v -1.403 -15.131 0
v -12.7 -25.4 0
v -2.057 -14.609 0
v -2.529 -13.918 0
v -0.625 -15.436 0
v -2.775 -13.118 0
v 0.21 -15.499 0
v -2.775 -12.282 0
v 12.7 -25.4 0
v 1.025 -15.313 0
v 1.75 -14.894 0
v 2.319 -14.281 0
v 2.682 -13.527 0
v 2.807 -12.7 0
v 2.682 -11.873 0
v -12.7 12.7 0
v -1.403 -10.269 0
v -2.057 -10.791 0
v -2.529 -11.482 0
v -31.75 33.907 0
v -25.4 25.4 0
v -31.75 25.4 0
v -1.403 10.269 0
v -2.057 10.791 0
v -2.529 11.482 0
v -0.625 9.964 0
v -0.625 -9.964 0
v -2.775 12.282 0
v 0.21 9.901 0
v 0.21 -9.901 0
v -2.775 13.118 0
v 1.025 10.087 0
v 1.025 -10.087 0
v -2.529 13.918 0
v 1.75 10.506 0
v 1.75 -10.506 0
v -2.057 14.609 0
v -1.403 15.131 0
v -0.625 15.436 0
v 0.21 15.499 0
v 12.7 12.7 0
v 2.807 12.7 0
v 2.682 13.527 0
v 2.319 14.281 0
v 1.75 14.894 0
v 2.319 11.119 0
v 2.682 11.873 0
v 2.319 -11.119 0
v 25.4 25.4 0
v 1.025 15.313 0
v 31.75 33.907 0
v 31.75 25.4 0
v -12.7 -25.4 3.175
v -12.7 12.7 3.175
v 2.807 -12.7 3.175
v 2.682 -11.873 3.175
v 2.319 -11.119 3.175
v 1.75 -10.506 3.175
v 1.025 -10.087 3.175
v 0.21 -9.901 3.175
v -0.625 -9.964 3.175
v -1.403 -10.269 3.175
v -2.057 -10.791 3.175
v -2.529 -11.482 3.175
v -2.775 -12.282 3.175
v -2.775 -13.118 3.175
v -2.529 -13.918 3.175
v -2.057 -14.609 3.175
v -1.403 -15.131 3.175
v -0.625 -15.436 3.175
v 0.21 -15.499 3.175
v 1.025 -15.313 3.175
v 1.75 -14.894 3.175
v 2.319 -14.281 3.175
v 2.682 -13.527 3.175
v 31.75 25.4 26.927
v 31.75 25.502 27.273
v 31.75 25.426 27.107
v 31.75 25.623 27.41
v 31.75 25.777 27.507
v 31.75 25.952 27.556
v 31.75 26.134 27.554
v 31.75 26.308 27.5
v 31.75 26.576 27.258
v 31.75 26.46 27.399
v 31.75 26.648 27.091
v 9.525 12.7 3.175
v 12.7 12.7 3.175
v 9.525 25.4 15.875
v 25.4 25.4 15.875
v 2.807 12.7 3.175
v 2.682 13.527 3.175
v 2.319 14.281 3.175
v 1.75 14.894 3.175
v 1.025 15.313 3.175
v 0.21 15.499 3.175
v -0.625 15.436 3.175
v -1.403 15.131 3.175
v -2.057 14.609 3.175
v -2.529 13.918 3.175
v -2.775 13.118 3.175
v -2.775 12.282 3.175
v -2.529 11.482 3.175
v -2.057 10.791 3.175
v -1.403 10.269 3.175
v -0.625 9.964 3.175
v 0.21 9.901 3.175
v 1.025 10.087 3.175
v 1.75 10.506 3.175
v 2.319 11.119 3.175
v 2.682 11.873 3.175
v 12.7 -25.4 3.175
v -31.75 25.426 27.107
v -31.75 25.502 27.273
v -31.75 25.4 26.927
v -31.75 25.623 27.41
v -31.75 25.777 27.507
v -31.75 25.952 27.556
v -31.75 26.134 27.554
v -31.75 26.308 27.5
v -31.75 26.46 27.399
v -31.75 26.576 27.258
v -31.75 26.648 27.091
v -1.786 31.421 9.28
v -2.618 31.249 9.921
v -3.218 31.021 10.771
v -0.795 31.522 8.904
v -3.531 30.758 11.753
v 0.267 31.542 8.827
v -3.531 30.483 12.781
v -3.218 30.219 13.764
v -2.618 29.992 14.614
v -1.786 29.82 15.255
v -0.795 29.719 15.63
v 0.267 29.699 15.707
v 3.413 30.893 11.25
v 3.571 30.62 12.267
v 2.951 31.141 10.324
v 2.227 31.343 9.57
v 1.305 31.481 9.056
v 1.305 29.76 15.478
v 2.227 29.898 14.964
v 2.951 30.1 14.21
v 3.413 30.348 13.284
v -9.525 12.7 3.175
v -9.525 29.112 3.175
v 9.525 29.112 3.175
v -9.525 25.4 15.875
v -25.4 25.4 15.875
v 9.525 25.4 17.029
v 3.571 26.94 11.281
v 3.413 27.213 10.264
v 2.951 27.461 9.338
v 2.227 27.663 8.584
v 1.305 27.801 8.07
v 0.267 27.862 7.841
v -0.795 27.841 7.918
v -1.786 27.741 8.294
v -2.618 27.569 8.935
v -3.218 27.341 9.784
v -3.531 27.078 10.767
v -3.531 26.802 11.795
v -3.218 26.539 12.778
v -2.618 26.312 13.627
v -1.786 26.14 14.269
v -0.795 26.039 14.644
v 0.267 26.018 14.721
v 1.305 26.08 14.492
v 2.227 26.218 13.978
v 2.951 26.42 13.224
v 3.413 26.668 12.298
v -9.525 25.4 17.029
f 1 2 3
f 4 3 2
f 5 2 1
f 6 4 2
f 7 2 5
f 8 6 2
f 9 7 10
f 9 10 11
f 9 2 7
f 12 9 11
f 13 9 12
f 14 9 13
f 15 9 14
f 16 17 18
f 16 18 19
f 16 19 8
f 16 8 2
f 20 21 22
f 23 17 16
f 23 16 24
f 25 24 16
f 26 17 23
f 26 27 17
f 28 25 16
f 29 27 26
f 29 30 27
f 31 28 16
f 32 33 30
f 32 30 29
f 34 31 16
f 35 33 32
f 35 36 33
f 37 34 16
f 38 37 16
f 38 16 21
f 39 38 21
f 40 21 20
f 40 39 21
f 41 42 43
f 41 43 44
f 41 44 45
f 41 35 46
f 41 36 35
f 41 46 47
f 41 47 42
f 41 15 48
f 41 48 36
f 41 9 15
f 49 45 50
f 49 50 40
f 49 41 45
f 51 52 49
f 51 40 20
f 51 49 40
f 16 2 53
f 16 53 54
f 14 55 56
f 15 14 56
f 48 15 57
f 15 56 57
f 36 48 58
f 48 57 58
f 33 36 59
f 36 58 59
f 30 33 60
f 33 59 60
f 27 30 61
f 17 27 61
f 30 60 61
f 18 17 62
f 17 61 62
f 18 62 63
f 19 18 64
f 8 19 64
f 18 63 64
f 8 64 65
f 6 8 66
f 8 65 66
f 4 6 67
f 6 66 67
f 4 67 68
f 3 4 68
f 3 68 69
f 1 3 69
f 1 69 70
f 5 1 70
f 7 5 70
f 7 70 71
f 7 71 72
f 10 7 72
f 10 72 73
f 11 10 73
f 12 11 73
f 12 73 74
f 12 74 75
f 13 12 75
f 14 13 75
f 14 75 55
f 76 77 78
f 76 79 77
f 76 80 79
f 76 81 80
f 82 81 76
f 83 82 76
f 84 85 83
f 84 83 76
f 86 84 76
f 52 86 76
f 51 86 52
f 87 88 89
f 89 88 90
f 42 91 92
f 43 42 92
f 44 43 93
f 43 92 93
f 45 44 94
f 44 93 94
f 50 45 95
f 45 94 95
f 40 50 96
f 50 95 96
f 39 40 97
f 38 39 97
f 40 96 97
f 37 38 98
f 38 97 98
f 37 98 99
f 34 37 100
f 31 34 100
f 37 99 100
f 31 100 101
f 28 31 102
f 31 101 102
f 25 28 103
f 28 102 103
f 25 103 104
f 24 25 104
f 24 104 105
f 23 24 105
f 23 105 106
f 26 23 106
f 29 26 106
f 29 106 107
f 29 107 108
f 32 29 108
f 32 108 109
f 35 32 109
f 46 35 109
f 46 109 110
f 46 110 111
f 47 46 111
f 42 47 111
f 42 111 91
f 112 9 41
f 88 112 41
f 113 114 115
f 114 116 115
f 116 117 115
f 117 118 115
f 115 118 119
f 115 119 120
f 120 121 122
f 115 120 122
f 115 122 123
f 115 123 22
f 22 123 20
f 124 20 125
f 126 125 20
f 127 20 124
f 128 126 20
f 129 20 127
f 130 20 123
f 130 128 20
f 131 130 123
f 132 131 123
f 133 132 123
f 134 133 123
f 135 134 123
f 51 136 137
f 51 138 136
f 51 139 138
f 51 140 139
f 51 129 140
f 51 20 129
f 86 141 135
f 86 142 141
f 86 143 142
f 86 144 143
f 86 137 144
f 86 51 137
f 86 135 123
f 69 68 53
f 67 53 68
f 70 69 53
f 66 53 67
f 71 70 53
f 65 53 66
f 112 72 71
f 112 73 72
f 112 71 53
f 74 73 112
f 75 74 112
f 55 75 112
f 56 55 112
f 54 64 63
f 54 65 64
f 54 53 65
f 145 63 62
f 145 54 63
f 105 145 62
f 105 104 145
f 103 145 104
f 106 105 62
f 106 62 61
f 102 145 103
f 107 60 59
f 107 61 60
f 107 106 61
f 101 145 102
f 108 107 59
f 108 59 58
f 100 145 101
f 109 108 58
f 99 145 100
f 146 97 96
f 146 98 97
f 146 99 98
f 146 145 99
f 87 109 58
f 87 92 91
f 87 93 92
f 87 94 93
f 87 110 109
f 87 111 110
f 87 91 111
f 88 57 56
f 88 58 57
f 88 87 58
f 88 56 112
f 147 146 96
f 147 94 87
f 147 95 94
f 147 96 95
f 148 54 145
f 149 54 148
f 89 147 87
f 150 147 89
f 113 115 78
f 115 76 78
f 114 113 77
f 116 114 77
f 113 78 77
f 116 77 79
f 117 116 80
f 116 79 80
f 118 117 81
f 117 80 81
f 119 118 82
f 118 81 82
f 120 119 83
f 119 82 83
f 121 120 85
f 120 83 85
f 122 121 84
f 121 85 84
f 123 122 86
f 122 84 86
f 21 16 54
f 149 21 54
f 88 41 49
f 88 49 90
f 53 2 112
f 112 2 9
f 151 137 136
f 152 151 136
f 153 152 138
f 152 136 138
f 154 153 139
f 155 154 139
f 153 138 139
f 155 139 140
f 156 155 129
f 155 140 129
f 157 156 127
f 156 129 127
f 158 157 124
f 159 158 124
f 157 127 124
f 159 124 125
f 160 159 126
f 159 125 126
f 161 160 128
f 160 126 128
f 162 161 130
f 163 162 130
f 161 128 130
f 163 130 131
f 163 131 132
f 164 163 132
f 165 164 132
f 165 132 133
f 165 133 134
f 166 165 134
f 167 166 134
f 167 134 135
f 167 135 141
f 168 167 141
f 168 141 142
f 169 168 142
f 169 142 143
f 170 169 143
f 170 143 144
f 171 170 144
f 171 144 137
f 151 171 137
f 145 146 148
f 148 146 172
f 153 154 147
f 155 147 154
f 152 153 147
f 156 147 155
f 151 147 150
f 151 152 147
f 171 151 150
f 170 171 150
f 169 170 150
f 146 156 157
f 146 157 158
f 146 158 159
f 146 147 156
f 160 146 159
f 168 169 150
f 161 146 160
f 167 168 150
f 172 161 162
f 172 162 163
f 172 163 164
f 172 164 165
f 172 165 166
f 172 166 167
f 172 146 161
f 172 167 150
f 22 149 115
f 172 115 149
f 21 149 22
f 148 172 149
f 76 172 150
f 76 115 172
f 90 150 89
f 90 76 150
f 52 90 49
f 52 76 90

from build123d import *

# Parameters (mm, degrees)
SKETCH1_W                       = 25.4
SKETCH1_H                       = 50.8
BOSS_EXTRUDE1_DEPTH             = 3.175
F_10_CLEARANCE_HOLE1_D          = 5.6134
BOSS_EXTRUDE3_DEPTH             = 31.75
CHAMFER2_SIZE                   = 12.7
FILLET2_R                       = 0.635
BOSS_EXTRUDE4_REACH             = 64.331
BOSS_EXTRUDE4_DIRECTION_2_DEPTH = 3.175
BOSS_EXTRUDE5_REACH             = 64.331
BOSS_EXTRUDE5_DIRECTION_2_DEPTH = 3.175
F_1_4_CLEARANCE_HOLE2_REACH     = 70.01
F_1_4_CLEARANCE_HOLE2_BORE_R    = 3.57124
CUT_EXTRUDE1_START              = -9.525
CUT_EXTRUDE1_DEPTH              = 19.05


# Read off the part's stored shape, not the designer's step: Cut-Extrude1
with BuildPart() as part:
    # Sketch1 → Boss-Extrude1 (new body)
    with BuildSketch(Plane.XY):
        Rectangle(SKETCH1_W, SKETCH1_H)
    extrude(amount=BOSS_EXTRUDE1_DEPTH)

    # #10 Clearance Hole1 (through all)
    with Locations(Plane(origin=(0, 0, 0), x_dir=(-1, 0, 0), z_dir=(0, 0, -1))):
        with Locations((0, 12.7), (0, -12.7)):
            Hole(F_10_CLEARANCE_HOLE1_D / 2)

    # Sketch8 → Boss-Extrude3 (add, symmetric)
    with BuildSketch(Plane(origin=(0, 0, 0), x_dir=(0, 0, -1), z_dir=(1, 0, 0))):
        Polygon((0, 33.90738686), (-31.75, 25.4), (0, 25.4), align=None)
    extrude(amount=BOSS_EXTRUDE3_DEPTH, both=True)

    # Chamfer2
    chamfer2_edges = [part.edges().sort_by_distance(p)[0] for p in [
        (-12.7, 25.4, 1.5875),
        (12.7, 25.4, 1.5875),
    ]]
    chamfer(chamfer2_edges, length=CHAMFER2_SIZE)

    # Fillet2
    fillet2_edges = [part.edges().sort_by_distance(p)[0] for p in [
        (0, 25.4, 31.75),
    ]]
    fillet(fillet2_edges, radius=FILLET2_R)

    # Boss-Extrude4: up to this face of the body (flat: up to its plane)
    boss_extrude4_end = Plane(part.part.faces().sort_by_distance((-19.05, 19.05, 1.5875))[0])
    # Sketch14 → Boss-Extrude4 (add, up to the picked face)
    with BuildSketch(Plane.ZY.offset(12.7), mode=Mode.PRIVATE) as boss_extrude4_sk1:
        Polygon((3.175, 12.7), (15.875, 25.4), (3.175, 25.4), align=None)
    boss_extrude4_tool1 = split(extrude(boss_extrude4_sk1.sketch, amount=BOSS_EXTRUDE4_REACH, mode=Mode.PRIVATE), bisect_by=boss_extrude4_end, keep=Keep.BOTH, mode=Mode.PRIVATE)
    add(boss_extrude4_tool1.solids().sort_by(Axis((-12.7, 21.166667, 7.408333), (-1, 0, 0)))[0])

    # Sketch14 → Boss-Extrude4 direction 2 (add)
    with BuildSketch(Plane.ZY.offset(12.7)):
        Polygon((3.175, 12.7), (15.875, 25.4), (3.175, 25.4), align=None)
    extrude(amount=-BOSS_EXTRUDE4_DIRECTION_2_DEPTH)

    # Boss-Extrude5: up to this face of the body (flat: up to its plane)
    boss_extrude5_end = Plane(part.part.faces().sort_by_distance((19.05, 19.05, 1.5875))[0])
    # Sketch15 → Boss-Extrude5 (add, up to the picked face)
    with BuildSketch(Plane(origin=(12.7, 0, 0), x_dir=(0, 0, -1), z_dir=(1, 0, 0)), mode=Mode.PRIVATE) as boss_extrude5_sk1:
        Polygon((-3.175, 12.7), (-15.875, 25.4), (-3.175, 25.4), align=None)
    boss_extrude5_tool1 = split(extrude(boss_extrude5_sk1.sketch, amount=BOSS_EXTRUDE5_REACH, mode=Mode.PRIVATE), bisect_by=boss_extrude5_end, keep=Keep.BOTH, mode=Mode.PRIVATE)
    add(boss_extrude5_tool1.solids().sort_by(Axis((12.7, 21.166667, 7.408333), (1, 0, 0)))[0])

    # Sketch15 → Boss-Extrude5 direction 2 (add)
    with BuildSketch(Plane(origin=(12.7, 0, 0), x_dir=(0, 0, -1), z_dir=(1, 0, 0))):
        Polygon((-3.175, 12.7), (-15.875, 25.4), (-3.175, 25.4), align=None)
    extrude(amount=-BOSS_EXTRUDE5_DIRECTION_2_DEPTH)

    # 1/4 Clearance Hole2 bore → 1/4 Clearance Hole2 (cut, up to next)
    with BuildSketch(Plane(origin=(0, 31.636022628, 8.476846715), x_dir=(1, 0, 0), z_dir=(0, 0.96592582628907, 0.2588190451025146)), mode=Mode.PRIVATE) as f_1_4_clearance_hole2_sk1:
        with Locations((0, -3.924122511)):
            Circle(F_1_4_CLEARANCE_HOLE2_BORE_R)
    f_1_4_clearance_hole2_tool1 = extrude(f_1_4_clearance_hole2_sk1.sketch, amount=-F_1_4_CLEARANCE_HOLE2_REACH, mode=Mode.PRIVATE) & part.part
    add(f_1_4_clearance_hole2_tool1.solids().sort_by_distance((0, 30.620385, 12.267258))[0], mode=Mode.SUBTRACT)

    # Cut-Extrude1 outline → Cut-Extrude1 (cut)
    with BuildSketch(Plane.YZ.offset(CUT_EXTRUDE1_START)):
        Polygon((29.112245926, 3.175), (25.4, 17.029290407), (25.4, 3.175), align=None)
    extrude(amount=CUT_EXTRUDE1_DEPTH, mode=Mode.SUBTRACT)


solid = part.part
